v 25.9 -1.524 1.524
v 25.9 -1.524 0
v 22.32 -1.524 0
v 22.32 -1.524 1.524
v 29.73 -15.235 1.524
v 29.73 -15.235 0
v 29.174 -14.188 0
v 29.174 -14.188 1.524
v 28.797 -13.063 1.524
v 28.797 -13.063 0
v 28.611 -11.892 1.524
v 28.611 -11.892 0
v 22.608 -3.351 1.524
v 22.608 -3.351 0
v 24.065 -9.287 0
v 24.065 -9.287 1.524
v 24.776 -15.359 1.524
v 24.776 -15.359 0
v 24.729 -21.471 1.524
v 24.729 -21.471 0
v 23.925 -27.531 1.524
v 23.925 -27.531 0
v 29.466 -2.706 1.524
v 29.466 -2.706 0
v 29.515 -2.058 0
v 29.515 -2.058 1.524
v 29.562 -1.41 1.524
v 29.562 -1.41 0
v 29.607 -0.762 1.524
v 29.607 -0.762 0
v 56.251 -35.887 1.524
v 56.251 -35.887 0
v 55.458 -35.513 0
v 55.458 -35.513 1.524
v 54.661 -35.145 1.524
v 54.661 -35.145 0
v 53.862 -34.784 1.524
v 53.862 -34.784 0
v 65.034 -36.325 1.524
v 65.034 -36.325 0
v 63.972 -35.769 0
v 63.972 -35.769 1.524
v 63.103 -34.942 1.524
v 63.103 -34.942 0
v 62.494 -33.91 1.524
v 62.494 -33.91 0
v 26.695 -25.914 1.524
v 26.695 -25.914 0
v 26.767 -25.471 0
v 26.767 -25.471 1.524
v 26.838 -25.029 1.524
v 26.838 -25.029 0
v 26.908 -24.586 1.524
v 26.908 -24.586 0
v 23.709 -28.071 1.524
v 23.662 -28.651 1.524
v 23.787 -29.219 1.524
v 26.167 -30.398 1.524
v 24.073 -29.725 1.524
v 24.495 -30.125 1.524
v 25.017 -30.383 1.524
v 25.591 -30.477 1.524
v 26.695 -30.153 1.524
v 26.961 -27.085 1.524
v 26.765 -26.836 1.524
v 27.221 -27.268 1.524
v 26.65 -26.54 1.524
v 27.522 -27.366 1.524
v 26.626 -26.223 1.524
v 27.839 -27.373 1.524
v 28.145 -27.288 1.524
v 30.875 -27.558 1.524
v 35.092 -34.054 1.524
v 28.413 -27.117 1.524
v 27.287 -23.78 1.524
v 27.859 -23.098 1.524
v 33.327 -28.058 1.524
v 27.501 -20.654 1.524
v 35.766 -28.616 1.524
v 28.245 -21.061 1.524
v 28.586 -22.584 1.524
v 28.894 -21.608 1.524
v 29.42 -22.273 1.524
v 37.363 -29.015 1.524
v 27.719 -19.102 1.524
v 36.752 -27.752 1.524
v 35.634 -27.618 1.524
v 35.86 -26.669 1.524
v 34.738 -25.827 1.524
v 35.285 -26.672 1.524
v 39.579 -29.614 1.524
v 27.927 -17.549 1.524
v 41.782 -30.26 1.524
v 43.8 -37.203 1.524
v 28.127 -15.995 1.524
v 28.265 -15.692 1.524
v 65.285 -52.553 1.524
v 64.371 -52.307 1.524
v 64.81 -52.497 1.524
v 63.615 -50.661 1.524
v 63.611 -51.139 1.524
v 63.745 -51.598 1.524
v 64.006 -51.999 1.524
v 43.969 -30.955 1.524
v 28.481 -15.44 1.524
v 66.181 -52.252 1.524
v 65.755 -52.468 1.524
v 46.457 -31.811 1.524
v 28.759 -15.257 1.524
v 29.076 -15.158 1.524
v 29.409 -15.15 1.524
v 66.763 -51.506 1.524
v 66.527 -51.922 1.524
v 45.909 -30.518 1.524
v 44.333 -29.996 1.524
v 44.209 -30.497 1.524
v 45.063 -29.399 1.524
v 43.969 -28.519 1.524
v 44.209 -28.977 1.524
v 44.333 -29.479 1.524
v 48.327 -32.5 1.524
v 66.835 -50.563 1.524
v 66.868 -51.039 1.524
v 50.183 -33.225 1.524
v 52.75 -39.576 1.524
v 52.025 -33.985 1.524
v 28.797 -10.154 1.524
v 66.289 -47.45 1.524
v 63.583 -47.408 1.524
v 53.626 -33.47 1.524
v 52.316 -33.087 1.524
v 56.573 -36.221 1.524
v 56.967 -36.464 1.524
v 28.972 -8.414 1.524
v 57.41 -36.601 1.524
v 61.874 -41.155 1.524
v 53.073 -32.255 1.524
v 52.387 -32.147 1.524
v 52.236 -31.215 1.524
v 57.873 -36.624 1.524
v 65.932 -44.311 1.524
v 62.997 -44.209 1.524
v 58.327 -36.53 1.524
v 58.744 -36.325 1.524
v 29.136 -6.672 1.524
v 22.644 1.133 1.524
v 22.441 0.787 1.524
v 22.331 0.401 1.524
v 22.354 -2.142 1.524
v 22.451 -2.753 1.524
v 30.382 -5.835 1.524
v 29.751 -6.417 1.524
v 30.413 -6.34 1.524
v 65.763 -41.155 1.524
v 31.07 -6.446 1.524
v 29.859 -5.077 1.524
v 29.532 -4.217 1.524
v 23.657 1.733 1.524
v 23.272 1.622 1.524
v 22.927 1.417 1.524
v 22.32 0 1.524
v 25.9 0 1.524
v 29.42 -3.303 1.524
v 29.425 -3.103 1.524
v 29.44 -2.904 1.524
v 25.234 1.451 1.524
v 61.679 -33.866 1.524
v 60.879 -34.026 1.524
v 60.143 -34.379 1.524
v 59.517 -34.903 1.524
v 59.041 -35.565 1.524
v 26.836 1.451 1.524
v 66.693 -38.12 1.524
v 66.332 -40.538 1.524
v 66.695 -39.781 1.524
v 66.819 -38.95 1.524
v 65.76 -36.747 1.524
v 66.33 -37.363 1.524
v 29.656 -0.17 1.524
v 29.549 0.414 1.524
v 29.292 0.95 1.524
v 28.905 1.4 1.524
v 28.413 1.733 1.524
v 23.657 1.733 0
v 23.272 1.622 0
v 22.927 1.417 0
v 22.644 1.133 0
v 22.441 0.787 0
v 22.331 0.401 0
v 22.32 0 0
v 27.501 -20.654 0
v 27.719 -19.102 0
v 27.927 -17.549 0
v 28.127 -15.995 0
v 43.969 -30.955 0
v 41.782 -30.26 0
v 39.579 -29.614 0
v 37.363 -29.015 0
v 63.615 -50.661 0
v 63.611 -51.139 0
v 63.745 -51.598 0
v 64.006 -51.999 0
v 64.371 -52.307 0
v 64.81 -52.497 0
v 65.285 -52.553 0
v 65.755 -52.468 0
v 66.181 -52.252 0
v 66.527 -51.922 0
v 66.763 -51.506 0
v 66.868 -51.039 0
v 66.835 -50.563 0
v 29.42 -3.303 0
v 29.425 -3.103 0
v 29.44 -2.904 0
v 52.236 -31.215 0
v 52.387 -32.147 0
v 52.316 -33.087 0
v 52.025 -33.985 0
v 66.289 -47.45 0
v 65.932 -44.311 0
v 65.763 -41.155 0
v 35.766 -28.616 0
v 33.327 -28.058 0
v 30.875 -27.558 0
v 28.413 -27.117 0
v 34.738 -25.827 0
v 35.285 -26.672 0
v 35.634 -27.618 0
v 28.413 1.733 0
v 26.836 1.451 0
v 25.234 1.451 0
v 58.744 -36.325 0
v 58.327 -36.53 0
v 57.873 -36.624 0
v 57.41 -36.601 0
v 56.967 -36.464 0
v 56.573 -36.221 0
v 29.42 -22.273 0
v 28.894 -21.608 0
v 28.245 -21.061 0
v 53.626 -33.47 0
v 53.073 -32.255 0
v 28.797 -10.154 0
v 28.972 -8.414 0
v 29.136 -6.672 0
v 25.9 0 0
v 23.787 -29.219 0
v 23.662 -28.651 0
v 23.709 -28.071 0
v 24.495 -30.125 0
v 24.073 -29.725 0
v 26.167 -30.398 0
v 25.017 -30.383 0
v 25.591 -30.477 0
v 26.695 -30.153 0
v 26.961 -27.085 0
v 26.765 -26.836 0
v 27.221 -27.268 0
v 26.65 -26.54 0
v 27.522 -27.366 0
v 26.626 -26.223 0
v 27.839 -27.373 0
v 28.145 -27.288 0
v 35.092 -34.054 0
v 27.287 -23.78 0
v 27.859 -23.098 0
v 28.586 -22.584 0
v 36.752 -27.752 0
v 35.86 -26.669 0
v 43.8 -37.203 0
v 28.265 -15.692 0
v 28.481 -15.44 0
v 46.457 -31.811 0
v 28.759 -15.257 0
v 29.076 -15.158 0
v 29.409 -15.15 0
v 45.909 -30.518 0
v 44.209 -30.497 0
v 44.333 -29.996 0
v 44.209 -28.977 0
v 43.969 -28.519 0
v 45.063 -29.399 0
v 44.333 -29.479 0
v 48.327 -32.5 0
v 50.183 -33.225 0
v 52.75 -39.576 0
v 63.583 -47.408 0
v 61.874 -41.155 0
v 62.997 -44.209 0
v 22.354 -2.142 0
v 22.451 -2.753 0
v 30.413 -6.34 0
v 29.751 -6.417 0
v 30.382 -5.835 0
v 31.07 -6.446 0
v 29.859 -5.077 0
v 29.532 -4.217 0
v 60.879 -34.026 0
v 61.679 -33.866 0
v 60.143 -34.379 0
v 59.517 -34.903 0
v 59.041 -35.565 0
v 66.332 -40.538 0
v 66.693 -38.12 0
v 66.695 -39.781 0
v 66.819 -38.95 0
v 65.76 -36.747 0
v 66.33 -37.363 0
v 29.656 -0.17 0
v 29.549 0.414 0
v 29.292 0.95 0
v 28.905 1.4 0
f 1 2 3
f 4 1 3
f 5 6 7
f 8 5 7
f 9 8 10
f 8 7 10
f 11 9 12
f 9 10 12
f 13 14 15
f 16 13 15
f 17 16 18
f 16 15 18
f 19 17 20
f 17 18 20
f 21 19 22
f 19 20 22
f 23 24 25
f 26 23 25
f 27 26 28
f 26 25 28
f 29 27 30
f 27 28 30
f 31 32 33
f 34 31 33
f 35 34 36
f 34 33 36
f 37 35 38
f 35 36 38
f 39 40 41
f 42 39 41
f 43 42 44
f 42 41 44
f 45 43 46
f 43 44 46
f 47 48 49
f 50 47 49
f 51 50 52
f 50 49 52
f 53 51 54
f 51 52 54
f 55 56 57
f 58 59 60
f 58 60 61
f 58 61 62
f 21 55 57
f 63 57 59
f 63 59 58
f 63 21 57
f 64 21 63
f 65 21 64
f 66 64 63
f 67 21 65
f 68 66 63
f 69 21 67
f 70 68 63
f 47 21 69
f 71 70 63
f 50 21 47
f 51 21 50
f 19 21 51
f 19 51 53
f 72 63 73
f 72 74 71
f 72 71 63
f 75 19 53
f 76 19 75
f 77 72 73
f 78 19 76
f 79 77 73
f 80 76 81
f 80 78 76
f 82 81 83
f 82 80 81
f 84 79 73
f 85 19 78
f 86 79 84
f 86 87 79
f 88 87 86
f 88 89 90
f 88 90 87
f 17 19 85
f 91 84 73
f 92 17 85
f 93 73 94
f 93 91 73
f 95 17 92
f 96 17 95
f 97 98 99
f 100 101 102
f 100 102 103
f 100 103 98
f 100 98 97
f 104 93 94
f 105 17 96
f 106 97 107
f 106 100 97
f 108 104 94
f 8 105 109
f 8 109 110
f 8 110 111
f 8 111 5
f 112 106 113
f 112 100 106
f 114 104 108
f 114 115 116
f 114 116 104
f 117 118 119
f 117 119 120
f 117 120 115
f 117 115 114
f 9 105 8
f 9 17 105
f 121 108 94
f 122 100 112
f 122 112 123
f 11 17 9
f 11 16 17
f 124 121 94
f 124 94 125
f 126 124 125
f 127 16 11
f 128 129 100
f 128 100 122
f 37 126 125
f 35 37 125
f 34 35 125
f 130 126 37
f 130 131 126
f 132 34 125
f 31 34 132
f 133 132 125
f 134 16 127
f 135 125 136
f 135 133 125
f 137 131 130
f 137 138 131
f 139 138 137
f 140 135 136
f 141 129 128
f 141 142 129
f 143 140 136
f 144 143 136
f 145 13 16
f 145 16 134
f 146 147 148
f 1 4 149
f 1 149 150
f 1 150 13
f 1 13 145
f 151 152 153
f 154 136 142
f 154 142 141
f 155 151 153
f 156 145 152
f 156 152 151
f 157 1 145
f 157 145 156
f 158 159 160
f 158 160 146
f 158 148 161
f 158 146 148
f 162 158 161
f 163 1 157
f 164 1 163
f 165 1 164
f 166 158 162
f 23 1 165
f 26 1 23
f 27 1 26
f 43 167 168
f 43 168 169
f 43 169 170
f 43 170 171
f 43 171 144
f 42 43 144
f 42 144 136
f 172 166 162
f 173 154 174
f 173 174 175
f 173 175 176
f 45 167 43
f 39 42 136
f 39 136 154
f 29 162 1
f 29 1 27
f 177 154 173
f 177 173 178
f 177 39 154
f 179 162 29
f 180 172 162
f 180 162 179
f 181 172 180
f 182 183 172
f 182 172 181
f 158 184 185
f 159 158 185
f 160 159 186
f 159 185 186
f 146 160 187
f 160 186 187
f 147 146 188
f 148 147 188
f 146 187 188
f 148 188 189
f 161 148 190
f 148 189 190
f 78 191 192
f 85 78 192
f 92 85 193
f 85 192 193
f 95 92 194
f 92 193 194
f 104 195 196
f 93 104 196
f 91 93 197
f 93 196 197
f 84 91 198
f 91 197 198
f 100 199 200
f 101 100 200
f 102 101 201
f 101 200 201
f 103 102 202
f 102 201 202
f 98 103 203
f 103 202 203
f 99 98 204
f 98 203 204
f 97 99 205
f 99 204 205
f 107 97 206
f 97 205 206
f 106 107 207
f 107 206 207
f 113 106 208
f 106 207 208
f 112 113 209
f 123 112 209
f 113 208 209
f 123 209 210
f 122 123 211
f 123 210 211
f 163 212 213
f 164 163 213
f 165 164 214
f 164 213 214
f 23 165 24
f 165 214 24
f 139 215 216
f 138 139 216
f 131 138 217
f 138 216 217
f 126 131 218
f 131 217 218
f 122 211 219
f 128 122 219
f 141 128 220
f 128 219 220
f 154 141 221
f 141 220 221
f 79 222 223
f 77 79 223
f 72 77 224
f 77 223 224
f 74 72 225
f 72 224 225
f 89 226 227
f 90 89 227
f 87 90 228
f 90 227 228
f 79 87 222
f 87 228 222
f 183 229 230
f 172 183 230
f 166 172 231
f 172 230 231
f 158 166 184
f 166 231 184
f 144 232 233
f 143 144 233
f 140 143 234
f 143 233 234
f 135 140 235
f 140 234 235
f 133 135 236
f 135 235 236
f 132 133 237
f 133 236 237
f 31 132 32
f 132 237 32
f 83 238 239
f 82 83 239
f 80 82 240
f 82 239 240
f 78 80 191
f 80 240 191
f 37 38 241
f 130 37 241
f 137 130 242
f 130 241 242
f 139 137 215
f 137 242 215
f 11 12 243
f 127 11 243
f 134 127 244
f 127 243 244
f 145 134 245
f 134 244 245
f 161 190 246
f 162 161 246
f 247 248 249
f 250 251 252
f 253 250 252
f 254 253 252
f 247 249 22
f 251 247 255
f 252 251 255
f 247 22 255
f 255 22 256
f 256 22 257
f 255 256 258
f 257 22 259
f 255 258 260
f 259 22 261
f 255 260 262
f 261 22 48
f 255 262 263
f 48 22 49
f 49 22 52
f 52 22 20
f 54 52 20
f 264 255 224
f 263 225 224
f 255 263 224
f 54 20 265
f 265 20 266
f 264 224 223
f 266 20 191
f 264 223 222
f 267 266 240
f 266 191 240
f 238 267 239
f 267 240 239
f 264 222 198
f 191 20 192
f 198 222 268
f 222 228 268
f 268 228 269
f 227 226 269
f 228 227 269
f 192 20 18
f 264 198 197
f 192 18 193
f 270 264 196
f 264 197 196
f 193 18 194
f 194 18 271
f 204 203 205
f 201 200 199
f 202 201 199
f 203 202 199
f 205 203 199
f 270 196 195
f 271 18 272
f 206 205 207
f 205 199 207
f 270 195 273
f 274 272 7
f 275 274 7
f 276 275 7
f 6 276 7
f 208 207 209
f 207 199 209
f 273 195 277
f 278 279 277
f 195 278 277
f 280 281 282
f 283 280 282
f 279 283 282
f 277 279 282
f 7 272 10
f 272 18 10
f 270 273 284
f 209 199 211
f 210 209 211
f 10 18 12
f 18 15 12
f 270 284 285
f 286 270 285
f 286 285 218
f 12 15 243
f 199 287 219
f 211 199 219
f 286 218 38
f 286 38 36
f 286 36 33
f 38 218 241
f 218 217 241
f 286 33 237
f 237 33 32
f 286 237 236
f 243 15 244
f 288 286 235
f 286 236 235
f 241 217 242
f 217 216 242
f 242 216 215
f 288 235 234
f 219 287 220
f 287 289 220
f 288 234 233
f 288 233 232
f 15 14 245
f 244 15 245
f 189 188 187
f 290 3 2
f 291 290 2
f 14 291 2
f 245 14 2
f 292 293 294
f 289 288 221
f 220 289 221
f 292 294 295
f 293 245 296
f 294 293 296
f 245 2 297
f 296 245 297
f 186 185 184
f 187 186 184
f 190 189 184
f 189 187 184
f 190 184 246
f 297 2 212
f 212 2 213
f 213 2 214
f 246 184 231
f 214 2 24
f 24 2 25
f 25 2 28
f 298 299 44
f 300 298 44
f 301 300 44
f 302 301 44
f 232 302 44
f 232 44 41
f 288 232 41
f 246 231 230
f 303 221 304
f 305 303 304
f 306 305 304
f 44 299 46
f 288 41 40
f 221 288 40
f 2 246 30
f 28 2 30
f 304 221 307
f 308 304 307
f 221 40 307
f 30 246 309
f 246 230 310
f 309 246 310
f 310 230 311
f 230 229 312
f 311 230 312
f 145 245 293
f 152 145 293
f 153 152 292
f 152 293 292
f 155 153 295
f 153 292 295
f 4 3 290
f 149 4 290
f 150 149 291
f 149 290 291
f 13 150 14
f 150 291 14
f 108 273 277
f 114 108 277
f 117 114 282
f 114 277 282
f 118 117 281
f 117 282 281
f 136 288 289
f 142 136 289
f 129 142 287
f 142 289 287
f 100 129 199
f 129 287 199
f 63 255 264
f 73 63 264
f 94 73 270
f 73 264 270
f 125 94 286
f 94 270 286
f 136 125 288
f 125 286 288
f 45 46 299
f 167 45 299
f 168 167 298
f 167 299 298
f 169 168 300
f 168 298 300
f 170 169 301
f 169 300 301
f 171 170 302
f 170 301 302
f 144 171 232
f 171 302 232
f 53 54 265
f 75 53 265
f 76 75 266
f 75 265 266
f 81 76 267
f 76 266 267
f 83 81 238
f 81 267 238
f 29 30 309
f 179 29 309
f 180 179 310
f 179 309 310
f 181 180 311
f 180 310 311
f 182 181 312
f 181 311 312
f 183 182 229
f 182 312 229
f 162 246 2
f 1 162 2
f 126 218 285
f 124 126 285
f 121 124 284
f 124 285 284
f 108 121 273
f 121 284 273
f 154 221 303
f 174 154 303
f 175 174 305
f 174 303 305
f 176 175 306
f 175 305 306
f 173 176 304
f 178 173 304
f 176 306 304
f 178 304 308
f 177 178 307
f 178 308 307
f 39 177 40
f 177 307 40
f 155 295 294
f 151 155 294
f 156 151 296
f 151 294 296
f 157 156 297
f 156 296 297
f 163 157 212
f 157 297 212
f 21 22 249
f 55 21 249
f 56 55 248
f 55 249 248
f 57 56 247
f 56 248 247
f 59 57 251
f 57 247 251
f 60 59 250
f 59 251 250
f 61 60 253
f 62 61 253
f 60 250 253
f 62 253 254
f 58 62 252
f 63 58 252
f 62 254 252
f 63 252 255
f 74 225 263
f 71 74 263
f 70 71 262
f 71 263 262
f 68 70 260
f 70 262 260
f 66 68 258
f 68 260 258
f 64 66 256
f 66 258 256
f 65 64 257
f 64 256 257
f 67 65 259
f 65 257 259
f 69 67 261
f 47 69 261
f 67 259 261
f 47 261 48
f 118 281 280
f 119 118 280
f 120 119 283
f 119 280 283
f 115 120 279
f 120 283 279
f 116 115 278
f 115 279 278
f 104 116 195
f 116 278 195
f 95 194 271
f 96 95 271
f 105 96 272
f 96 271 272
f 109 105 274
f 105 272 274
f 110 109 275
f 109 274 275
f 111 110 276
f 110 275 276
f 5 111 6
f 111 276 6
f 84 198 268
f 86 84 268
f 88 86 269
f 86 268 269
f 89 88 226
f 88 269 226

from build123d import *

# Parameters (mm, degrees)
BOSS_EXTRUDE1_DEPTH = 1.524


with BuildPart() as part:
    # Sketch1 → Boss-Extrude1 (new body)
    with BuildSketch(Plane.XY):
        with BuildLine():
            Line((25.899875794, 0), (25.899875794, -1.524))
            Line((25.899875794, -1.524), (22.32048354, -1.524))
            ThreePointArc((22.32048354, -1.524), (22.394704152, -2.448389179), (22.608367924, -3.350803633))
            ThreePointArc((22.608367924, -3.350803633), (24.775682693, -15.358642742), (23.925034543, -27.530818024))
            ThreePointArc((23.925034543, -27.530818024), (24.269313487, -29.941018013), (26.694765546, -30.152617376))
            ThreePointArc((26.694765546, -30.152617376), (43.800025443, -37.203050355), (61.874254559, -41.155361478))
            ThreePointArc((61.874254559, -41.155361478), (63.35881503, -45.79590736), (63.615238945, -50.661380887))
            ThreePointArc((63.615238945, -50.661380887), (65.284550388, -52.552507853), (66.8346767, -50.562515312))
            ThreePointArc((66.8346767, -50.562515312), (66.086863923, -45.883082095), (65.762862434, -41.155361478))
            ThreePointArc((65.762862434, -41.155361478), (66.787088001, -38.530646728), (65.033651376, -36.325283826))
            ThreePointArc((65.033651376, -36.325283826), (63.508505747, -35.385780492), (62.493571354, -33.909757498))
            ThreePointArc((62.493571354, -33.909757498), (60.142882659, -34.378985159), (58.743656643, -36.325283826))
            ThreePointArc((58.743656643, -36.325283826), (57.410289813, -36.601347141), (56.250770366, -35.887489516))
            ThreePointArc((56.250770366, -35.887489516), (55.059942052, -35.328446838), (53.862175702, -34.784427942))
            ThreePointArc((53.862175702, -34.784427942), (53.387744375, -32.845536507), (52.235990682, -31.215245578))
            ThreePointArc((52.235990682, -31.215245578), (52.379437809, -32.619080701), (52.025456966, -33.985106943))
            ThreePointArc((52.025456966, -33.985106943), (49.256787636, -32.858021413), (46.457035721, -31.810528756))
            ThreePointArc((46.457035721, -31.810528756), (45.520333016, -29.932577753), (43.969177054, -28.519061884))
            ThreePointArc((43.969177054, -28.519061884), (44.348322504, -29.737128844), (43.969177054, -30.955195804))
            ThreePointArc((43.969177054, -30.955195804), (40.682262853, -29.930853217), (37.363411838, -29.015260162))
            ThreePointArc((37.363411838, -29.015260162), (36.338596802, -27.1840345), (34.737637182, -25.82736152))
            ThreePointArc((34.737637182, -25.82736152), (35.485911293, -27.135318264), (35.76553834, -28.616018674))
            ThreePointArc((35.76553834, -28.616018674), (32.102551283, -27.80064259), (28.412668556, -27.117211688))
            ThreePointArc((28.412668556, -27.117211688), (27.08385139, -27.186040378), (26.694765546, -25.913599945))
            ThreePointArc((26.694765546, -25.913599945), (26.802310466, -25.249830728), (26.908212993, -24.585797492))
            ThreePointArc((26.908212993, -24.585797492), (27.859098363, -23.097961687), (29.420120996, -22.272706147))
            ThreePointArc((29.420120996, -22.272706147), (28.583123123, -21.317792963), (27.500905932, -20.653541067))
            ThreePointArc((27.500905932, -20.653541067), (27.824154163, -18.325383322), (28.127257878, -15.994517379))
            ThreePointArc((28.127257878, -15.994517379), (28.758910246, -15.256602171), (29.730007897, -15.234855434))
            ThreePointArc((29.730007897, -15.234855434), (28.962069061, -13.633439137), (28.611030242, -11.892452072))
            ThreePointArc((28.611030242, -11.892452072), (28.885875625, -9.28370644), (29.135532328, -6.672429877))
            ThreePointArc((29.135532328, -6.672429877), (30.079064964, -6.355518981), (31.070294126, -6.44580243))
            ThreePointArc((31.070294126, -6.44580243), (29.85894962, -5.077426559), (29.420124937, -3.303380072))
            ThreePointArc((29.420124937, -3.303380072), (29.431447758, -3.003641616), (29.466206898, -2.705710163))
            ThreePointArc((29.466206898, -2.705710163), (29.538300485, -1.73398118), (29.606910148, -0.762))
            ThreePointArc((29.606910148, -0.762), (29.438405233, 0.690848146), (28.412668556, 1.733453494))
            ThreePointArc((28.412668556, 1.733453494), (26.035003808, 1.415915884), (23.657339059, 1.733453494))
            ThreePointArc((23.657339059, 1.733453494), (22.643555103, 1.133068669), (22.32048354, 0))
            Line((22.32048354, 0), (25.899875794, 0))
        make_face()
    extrude(amount=BOSS_EXTRUDE1_DEPTH)


solid = part.part
